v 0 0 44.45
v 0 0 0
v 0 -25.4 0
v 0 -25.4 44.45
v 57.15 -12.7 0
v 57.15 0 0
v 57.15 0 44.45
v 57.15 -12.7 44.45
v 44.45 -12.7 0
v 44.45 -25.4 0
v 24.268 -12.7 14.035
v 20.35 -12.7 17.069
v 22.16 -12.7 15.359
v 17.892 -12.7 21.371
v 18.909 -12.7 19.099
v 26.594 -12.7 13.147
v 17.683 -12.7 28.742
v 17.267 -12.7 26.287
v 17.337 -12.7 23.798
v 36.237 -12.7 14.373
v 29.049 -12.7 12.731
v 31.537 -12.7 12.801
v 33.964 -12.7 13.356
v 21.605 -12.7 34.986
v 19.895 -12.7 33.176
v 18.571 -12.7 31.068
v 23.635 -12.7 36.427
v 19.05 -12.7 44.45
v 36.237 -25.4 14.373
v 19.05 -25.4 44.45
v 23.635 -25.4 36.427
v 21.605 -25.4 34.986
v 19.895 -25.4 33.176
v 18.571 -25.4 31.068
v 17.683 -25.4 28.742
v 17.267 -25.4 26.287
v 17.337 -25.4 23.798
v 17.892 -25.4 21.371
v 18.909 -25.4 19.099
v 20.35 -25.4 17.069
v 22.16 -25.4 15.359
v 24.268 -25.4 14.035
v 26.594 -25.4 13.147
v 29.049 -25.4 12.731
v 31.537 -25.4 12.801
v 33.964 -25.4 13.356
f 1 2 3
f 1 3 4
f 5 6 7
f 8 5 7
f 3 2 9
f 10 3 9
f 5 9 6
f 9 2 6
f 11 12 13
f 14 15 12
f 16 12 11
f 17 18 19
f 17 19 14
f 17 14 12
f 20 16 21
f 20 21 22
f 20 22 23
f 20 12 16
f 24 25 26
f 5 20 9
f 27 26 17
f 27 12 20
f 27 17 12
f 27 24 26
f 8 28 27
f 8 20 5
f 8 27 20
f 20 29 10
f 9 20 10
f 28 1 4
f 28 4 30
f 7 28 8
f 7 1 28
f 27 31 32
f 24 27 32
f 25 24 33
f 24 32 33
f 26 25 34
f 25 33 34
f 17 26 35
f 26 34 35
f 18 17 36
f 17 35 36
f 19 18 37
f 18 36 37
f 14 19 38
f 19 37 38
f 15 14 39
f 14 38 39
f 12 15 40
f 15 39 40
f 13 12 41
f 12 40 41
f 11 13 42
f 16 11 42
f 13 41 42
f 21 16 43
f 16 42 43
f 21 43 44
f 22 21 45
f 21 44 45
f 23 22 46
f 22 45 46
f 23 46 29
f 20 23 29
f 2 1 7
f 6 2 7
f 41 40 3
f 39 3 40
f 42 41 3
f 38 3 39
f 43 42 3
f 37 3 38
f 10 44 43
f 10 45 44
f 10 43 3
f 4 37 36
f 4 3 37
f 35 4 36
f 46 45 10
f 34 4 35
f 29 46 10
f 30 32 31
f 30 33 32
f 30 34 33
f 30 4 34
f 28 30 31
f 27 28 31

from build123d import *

# Parameters (mm, degrees)
F0_W     = 57.15
F0_H     = 44.45
F1_DEPTH = 25.4
F3_DEPTH = 12.7
F5_DEPTH = 12.7


with BuildPart() as f1:
    # F0 (on Front) → F1 (new body)
    with BuildSketch(Plane.XZ):
        with Locations((28.575, 22.225)):
            Rectangle(F0_W, F0_H)
    extrude(amount=F1_DEPTH)

    # F2 (on face) → F3 (cut)
    with BuildSketch(Plane.XZ.offset(25.4)):
        Polygon((57.15, 44.45), (19.05, 44.45), (44.45, 0), (57.15, 0), align=None)
    extrude(amount=-F3_DEPTH, mode=Mode.SUBTRACT)

    # F4 (on face) → F5 (cut)
    with BuildSketch(Plane.XZ.offset(25.4)):
        with BuildLine():
            Line((36.236679, 14.373312), (23.63475, 36.426688))
            ThreePointArc((23.63475, 36.426688), (18.909026, 19.099035), (36.236679, 14.373312))
        make_face()
    extrude(amount=-F5_DEPTH, mode=Mode.SUBTRACT)


solid = f1.part
